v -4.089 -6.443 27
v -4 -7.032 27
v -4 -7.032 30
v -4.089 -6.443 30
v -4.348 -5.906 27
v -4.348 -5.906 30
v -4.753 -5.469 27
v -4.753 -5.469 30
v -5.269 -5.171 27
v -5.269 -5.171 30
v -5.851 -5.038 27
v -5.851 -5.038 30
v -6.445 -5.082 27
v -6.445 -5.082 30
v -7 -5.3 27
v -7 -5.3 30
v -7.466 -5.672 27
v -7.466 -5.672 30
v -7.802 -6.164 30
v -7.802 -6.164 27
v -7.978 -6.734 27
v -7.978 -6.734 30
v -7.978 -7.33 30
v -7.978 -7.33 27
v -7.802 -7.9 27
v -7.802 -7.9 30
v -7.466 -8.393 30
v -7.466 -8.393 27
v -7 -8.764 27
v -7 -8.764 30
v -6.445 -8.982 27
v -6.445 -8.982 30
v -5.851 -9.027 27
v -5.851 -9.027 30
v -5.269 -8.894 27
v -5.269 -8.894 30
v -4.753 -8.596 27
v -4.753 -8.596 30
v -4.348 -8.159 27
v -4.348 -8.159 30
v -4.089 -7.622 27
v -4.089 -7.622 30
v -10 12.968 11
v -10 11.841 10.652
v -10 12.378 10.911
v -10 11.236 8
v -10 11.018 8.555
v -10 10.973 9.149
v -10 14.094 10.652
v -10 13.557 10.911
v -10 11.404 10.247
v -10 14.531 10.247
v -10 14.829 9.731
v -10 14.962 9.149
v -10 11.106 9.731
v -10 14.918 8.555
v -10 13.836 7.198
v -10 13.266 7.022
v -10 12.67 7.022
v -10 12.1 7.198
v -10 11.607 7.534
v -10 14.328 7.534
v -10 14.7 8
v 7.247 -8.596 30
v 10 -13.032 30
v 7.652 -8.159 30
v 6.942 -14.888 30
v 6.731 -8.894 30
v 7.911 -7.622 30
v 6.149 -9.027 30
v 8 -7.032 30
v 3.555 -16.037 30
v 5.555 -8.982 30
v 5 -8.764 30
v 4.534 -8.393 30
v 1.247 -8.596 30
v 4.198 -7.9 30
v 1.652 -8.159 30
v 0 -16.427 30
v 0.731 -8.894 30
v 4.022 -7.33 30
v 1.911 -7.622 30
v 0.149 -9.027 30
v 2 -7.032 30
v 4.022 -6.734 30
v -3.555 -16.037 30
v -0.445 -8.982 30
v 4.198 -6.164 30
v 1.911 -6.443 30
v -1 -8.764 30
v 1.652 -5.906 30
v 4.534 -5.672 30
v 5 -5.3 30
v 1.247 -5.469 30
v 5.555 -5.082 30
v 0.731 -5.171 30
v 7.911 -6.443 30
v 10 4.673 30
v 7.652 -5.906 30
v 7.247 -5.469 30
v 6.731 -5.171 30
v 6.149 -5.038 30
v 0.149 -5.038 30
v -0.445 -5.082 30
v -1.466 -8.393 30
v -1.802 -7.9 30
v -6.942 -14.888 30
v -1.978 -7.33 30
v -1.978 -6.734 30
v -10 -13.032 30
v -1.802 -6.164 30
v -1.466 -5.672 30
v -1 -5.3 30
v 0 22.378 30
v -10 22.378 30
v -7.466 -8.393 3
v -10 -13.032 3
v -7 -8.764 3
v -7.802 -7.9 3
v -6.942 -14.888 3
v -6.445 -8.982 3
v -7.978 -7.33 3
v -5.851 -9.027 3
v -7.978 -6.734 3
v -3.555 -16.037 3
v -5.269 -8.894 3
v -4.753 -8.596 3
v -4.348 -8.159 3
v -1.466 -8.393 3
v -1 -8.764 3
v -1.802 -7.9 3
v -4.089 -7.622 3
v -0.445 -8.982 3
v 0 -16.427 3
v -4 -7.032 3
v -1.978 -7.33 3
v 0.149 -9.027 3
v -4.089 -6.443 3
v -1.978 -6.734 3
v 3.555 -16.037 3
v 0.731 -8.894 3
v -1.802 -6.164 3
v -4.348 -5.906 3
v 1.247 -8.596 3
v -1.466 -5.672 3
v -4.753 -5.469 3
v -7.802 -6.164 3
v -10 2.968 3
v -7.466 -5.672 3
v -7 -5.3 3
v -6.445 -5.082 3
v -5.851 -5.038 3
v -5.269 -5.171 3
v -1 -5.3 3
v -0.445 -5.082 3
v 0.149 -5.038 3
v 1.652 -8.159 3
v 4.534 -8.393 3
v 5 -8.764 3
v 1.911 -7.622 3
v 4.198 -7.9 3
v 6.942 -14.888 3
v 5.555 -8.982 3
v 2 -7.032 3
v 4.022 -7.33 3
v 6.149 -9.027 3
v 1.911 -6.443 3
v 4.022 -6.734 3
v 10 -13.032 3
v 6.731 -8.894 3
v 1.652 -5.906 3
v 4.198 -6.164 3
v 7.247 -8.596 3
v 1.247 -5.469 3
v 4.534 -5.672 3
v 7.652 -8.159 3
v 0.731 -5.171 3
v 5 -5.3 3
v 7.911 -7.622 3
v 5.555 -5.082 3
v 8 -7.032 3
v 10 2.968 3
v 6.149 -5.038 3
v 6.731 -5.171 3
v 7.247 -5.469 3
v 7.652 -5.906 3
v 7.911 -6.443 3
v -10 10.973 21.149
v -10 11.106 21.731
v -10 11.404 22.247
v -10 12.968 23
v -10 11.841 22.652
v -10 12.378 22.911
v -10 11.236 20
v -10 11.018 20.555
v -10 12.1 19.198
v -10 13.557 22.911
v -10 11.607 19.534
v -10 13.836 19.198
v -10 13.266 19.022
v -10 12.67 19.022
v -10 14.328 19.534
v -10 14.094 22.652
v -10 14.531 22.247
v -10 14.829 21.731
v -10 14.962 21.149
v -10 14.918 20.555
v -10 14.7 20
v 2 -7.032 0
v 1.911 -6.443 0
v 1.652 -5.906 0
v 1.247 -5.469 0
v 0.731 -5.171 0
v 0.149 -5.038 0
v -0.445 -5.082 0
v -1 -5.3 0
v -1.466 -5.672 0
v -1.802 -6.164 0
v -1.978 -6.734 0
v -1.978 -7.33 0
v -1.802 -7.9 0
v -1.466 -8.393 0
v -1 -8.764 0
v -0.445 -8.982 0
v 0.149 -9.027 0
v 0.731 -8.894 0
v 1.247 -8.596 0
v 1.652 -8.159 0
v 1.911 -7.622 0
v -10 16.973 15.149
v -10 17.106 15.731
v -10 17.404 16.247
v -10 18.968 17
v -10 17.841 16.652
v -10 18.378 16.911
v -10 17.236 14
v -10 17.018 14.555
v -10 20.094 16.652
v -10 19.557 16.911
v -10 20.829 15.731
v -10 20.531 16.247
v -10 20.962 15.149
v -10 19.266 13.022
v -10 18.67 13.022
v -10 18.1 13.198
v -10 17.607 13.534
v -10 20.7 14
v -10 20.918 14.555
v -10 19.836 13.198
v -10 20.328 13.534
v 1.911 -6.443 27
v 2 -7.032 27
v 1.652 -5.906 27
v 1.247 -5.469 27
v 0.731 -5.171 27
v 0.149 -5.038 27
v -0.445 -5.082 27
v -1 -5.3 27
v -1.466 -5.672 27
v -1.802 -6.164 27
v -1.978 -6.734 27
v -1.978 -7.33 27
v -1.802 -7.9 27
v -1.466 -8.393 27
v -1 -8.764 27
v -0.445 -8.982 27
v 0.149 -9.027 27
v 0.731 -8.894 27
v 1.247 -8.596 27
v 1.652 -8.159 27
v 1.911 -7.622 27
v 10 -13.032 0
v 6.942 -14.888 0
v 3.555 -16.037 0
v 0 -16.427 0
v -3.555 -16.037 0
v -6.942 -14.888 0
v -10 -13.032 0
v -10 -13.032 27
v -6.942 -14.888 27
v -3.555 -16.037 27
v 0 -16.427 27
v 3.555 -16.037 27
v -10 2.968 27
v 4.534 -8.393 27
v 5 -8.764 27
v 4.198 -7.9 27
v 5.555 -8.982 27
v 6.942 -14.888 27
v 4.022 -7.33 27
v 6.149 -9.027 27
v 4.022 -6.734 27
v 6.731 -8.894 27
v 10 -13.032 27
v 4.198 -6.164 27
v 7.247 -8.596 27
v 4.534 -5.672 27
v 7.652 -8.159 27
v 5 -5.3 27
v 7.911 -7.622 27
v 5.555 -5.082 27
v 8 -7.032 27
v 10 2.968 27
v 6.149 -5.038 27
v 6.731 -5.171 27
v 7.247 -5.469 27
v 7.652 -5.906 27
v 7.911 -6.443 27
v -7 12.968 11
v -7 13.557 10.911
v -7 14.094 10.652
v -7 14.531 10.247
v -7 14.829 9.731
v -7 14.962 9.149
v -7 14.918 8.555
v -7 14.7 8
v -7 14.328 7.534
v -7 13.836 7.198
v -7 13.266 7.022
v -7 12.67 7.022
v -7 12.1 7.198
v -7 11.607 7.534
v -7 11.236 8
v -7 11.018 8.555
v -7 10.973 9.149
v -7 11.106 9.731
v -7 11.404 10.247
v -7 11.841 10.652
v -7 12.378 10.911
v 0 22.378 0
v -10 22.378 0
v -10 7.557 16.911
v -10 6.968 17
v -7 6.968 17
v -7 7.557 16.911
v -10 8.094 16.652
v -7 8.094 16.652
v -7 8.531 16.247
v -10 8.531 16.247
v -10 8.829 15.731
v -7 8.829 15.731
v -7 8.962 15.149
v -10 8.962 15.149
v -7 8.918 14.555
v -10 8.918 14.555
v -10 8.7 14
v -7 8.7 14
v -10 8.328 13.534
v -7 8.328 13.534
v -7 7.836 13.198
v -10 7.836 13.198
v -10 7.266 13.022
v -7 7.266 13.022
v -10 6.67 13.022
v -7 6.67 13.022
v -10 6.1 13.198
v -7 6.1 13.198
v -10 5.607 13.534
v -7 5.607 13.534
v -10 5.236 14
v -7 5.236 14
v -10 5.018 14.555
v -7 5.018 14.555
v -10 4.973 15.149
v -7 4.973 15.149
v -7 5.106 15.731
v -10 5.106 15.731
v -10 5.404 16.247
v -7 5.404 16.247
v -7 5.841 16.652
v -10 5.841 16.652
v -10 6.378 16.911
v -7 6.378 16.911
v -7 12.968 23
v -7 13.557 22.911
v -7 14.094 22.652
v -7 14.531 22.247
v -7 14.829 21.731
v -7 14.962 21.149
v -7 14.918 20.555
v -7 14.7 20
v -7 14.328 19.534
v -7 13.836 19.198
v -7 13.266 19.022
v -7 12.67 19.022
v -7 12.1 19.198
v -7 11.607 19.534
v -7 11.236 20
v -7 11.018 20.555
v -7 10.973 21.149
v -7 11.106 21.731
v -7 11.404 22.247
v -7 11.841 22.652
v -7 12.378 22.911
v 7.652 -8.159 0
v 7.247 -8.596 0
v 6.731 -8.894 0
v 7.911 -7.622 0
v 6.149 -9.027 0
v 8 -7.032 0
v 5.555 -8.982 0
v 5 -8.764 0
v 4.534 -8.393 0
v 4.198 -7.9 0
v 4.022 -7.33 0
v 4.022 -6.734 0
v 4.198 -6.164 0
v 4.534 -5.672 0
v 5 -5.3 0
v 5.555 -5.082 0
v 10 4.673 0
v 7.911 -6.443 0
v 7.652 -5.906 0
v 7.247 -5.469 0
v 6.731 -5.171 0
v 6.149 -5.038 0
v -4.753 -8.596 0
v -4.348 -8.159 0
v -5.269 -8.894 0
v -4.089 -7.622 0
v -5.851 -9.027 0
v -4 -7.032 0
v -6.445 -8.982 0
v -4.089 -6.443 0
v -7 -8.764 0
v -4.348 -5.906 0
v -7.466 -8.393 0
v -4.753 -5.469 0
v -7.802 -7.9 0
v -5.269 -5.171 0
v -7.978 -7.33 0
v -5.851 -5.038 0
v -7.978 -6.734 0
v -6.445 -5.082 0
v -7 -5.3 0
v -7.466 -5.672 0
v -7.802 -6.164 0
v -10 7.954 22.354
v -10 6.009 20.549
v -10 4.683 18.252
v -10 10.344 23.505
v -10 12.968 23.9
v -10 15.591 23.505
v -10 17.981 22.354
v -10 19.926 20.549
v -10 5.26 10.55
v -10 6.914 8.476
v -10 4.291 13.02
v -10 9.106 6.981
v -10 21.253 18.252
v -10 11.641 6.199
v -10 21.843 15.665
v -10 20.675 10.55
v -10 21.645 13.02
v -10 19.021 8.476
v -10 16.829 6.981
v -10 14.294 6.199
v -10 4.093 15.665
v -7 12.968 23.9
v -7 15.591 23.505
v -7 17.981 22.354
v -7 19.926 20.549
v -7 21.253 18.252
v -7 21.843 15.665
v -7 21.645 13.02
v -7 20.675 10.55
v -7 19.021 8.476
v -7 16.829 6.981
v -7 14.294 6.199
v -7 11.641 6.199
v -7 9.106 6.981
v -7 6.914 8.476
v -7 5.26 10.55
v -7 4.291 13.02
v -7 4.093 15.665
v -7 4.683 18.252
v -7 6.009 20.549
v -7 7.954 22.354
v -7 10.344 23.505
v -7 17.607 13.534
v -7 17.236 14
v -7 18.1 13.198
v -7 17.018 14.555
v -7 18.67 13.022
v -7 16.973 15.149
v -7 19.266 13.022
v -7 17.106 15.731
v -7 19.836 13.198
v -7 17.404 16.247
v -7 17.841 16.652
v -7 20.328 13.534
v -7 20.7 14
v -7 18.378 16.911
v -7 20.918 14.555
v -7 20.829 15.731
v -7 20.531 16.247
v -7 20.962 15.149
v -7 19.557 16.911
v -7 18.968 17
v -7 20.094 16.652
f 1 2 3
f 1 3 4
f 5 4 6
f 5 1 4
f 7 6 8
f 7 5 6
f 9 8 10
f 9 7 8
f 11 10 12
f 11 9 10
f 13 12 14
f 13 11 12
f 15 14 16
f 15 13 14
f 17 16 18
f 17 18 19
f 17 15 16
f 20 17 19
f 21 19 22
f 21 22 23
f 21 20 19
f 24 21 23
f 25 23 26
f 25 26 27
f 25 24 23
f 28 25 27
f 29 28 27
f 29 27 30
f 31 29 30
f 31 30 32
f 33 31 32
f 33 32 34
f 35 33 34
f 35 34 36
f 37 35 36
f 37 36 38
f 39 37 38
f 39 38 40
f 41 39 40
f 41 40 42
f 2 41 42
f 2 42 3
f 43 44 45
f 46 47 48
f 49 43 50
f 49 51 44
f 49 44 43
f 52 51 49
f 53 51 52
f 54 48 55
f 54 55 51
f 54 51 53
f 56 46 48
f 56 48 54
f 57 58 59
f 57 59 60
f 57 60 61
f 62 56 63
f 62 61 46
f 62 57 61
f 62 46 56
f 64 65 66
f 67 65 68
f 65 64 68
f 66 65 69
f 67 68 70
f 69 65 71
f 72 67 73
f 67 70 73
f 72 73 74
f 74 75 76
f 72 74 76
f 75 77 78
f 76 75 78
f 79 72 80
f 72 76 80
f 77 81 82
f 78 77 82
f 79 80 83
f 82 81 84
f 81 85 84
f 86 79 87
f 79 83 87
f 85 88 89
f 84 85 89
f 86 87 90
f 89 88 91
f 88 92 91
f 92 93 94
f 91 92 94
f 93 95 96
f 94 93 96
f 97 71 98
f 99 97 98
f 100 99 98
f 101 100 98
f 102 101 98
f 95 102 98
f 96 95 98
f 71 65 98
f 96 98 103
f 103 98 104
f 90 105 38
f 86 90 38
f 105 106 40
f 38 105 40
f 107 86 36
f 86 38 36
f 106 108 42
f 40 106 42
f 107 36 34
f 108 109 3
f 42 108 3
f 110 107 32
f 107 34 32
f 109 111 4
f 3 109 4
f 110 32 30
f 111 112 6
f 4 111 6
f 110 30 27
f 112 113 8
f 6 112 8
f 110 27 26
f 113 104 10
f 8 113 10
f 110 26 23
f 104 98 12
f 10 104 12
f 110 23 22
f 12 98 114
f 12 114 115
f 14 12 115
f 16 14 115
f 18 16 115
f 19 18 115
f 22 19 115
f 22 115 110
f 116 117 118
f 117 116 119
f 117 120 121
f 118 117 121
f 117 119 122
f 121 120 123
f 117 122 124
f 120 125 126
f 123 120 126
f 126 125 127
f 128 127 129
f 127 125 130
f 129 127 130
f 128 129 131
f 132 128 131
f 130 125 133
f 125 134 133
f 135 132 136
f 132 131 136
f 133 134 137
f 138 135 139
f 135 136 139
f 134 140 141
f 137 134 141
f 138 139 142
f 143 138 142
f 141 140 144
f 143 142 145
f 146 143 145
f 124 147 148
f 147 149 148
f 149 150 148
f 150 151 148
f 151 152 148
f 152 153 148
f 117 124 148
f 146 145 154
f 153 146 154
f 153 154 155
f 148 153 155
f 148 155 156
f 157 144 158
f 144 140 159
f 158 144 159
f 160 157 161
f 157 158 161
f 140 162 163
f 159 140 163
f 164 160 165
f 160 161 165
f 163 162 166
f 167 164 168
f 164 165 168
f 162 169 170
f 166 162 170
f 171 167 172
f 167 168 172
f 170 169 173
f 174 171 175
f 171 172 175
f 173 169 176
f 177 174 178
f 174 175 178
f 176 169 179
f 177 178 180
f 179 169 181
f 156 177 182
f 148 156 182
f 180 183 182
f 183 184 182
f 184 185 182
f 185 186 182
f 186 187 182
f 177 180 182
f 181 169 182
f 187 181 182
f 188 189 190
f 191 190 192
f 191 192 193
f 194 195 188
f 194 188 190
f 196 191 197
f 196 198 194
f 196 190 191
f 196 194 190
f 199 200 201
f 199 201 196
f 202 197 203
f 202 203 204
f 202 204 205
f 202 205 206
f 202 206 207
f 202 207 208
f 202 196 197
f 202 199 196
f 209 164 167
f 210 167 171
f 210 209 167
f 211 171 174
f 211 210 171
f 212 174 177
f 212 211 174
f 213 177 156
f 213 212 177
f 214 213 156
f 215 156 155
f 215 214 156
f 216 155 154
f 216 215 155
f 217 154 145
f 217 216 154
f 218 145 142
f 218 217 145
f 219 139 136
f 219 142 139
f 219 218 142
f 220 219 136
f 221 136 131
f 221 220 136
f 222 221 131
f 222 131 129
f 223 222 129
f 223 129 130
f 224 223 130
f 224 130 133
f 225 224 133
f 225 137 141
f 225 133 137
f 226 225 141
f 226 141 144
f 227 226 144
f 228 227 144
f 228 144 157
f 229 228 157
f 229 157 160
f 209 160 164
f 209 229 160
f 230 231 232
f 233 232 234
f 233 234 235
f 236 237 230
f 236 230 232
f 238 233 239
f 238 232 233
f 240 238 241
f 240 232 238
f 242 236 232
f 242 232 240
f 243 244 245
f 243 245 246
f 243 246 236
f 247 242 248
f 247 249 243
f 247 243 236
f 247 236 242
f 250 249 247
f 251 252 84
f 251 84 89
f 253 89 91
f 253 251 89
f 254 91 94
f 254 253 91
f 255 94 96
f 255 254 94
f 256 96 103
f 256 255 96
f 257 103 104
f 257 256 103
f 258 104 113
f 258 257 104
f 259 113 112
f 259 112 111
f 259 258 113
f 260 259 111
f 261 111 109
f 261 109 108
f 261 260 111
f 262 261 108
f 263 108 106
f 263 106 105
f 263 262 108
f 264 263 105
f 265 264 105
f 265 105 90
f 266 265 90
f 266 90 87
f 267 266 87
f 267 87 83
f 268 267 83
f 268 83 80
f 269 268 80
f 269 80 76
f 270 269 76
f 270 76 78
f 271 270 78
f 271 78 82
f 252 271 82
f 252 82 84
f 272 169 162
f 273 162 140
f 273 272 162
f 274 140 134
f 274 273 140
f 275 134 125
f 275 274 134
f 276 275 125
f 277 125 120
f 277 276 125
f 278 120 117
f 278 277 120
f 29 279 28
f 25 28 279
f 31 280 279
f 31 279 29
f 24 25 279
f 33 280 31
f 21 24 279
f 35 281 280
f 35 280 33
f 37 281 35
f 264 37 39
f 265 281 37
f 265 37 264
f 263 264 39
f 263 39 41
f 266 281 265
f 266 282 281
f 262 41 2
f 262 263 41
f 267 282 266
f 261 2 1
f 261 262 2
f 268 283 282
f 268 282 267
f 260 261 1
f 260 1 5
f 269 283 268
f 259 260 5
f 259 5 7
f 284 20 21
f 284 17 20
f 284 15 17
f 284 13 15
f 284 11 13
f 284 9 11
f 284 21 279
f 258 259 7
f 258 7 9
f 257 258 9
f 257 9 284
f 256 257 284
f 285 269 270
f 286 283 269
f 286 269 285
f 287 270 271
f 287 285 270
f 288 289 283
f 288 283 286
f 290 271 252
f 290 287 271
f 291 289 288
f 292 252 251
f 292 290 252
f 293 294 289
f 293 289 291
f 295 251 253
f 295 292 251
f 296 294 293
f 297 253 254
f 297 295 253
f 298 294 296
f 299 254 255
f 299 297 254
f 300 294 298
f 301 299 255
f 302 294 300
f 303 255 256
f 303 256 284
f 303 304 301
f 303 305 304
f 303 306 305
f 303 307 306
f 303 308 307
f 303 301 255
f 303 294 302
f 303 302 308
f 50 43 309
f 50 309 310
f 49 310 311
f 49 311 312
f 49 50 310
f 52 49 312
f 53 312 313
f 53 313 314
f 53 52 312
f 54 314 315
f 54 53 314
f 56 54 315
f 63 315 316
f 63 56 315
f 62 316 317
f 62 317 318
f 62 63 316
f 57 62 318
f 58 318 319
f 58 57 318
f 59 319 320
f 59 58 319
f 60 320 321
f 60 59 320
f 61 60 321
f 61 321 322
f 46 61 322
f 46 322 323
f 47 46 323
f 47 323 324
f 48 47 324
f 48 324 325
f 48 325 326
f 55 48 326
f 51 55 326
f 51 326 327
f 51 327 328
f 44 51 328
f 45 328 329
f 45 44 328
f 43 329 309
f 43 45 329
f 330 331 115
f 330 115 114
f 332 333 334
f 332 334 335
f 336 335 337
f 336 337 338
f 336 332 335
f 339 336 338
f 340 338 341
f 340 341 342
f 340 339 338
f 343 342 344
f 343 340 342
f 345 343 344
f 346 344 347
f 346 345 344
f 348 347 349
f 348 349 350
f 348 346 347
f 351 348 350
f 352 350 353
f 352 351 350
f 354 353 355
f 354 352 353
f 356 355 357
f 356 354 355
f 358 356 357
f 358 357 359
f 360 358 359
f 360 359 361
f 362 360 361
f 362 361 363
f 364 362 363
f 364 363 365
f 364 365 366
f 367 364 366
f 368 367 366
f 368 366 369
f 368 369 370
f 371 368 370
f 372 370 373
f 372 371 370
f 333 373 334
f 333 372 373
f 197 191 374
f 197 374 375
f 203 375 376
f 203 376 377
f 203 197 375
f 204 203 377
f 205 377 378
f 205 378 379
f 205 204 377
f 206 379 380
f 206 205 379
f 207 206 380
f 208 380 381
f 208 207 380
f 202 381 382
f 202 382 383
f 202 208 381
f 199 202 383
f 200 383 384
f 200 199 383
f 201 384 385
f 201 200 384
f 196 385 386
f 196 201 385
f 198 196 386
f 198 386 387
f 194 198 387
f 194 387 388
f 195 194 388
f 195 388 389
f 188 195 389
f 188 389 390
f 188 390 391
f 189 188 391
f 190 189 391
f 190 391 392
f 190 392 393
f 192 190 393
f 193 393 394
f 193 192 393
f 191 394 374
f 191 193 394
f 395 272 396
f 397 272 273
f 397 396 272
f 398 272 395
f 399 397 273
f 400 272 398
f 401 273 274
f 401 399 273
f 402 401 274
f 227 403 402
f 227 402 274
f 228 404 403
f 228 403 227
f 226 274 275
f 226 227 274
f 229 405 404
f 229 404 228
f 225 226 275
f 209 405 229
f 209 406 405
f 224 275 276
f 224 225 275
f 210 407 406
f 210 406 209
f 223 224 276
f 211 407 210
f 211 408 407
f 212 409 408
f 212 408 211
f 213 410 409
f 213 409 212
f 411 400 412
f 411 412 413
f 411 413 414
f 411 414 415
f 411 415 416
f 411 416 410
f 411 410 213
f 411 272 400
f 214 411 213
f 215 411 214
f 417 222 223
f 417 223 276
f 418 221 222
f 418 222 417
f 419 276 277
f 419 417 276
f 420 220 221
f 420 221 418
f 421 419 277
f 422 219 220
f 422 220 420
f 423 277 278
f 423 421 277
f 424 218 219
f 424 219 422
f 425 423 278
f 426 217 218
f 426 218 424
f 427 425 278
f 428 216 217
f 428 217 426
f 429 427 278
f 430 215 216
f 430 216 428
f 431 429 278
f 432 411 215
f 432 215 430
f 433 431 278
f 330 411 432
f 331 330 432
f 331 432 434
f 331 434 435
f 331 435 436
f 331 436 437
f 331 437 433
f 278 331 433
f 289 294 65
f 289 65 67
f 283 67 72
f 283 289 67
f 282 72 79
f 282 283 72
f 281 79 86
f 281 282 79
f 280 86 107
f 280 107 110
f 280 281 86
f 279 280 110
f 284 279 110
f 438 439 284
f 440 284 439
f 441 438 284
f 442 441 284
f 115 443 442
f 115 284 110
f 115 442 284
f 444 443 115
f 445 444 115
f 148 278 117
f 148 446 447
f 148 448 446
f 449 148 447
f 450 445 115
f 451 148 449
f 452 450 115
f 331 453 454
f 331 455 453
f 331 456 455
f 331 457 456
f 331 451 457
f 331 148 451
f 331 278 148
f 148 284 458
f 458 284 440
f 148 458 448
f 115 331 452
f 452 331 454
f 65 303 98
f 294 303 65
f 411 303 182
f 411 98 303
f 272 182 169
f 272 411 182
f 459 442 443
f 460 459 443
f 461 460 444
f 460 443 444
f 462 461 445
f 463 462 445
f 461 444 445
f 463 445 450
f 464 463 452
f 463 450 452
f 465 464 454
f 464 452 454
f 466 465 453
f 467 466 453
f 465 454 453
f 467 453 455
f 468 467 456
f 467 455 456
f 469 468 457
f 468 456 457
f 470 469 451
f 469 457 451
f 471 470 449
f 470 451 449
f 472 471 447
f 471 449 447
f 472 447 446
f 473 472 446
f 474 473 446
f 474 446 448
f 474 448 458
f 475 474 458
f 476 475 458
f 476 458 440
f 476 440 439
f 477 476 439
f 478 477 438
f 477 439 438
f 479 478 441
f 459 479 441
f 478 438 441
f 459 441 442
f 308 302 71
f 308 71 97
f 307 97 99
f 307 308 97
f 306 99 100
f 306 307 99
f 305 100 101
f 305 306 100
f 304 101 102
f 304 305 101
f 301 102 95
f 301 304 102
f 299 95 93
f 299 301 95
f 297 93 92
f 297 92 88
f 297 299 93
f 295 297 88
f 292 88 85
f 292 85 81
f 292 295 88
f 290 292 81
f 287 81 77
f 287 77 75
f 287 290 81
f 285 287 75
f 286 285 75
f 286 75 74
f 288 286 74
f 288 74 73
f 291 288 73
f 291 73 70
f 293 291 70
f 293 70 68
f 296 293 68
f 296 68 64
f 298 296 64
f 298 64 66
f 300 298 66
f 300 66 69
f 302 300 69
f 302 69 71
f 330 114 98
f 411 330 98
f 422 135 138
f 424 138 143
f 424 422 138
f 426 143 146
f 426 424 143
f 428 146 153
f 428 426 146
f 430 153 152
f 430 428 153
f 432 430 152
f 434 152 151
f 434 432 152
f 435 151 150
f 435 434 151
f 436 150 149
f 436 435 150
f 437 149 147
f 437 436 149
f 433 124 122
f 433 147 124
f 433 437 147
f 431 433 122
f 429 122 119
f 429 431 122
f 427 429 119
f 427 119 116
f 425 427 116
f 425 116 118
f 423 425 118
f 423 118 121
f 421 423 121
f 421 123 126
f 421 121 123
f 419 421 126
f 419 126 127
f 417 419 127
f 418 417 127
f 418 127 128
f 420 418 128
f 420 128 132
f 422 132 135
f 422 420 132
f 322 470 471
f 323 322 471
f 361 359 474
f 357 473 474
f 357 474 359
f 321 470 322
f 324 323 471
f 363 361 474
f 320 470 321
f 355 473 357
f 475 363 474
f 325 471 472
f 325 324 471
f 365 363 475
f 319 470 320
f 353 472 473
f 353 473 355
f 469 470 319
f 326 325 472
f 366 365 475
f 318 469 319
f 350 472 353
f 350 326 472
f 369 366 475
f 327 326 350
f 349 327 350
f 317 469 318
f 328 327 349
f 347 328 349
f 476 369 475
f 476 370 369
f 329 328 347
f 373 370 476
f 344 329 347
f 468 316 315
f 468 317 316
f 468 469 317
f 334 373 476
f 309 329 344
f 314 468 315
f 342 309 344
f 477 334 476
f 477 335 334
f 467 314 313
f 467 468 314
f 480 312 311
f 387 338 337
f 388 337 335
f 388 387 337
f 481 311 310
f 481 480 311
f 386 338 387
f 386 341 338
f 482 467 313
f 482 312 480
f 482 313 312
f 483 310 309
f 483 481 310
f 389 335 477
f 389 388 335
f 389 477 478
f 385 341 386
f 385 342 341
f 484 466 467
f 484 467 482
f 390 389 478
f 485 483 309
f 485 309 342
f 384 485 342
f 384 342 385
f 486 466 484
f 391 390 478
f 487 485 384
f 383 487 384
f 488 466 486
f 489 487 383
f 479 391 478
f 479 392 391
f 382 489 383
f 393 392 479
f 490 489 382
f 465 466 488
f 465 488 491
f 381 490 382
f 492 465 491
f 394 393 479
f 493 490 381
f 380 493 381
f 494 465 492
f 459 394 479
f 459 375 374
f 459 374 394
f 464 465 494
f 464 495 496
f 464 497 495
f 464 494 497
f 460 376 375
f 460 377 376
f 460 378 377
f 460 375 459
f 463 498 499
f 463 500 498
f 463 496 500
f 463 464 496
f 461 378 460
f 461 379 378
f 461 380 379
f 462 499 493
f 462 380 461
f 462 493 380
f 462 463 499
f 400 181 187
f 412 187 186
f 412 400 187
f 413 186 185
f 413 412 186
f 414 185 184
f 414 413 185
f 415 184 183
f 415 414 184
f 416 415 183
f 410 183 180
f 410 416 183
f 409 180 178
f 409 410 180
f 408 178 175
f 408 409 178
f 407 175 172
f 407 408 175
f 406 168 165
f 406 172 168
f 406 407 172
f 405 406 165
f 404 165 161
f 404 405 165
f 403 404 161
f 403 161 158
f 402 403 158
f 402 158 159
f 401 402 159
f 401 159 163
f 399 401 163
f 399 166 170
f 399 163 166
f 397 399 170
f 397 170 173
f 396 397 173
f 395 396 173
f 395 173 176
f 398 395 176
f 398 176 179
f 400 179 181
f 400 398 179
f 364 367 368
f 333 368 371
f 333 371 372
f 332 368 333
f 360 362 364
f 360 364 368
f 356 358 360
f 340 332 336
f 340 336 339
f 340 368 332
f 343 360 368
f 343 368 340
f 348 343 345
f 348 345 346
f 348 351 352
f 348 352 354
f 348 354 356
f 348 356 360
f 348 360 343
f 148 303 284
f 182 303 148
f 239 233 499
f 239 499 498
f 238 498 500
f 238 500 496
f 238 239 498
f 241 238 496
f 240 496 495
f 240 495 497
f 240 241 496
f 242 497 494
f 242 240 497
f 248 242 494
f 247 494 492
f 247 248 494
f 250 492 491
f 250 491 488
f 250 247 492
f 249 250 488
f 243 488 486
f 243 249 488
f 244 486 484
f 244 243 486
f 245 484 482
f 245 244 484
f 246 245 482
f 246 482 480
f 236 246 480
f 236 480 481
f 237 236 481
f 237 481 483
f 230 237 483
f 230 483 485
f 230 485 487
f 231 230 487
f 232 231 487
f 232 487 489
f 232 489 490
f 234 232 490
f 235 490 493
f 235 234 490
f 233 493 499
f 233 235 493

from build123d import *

# Parameters (mm, degrees)
SKETCH1_R           = 2
BOSS_EXTRUDE1_DEPTH = 30
SKETCH2_W           = 24
SKETCH2_H           = 19.394542589
CUT_EXTRUDE1_DEPTH  = 43.435404183
SKETCH3_R           = 8.9
SKETCH3_R_2         = 2
CUT_EXTRUDE2_DEPTH  = 3


with BuildPart() as part:
    # Sketch1 → Boss-Extrude1 (new body)
    with BuildSketch(Plane.XY):
        with BuildLine():
            Line((-10, 22.377746272), (0, 22.377746272))
            Line((0, 22.377746272), (10, 4.672746272))
            Line((10, 4.672746272), (10, -13.032253728))
            ThreePointArc((10, -13.032253728), (0, -16.426796317), (-10, -13.032253728))
            Line((-10, -13.032253728), (-10, 22.377746272))
        make_face()
        with Locations((0, -7.032253728)):
            Circle(SKETCH1_R, mode=Mode.SUBTRACT)
        with Locations((6, -7.032253728)):
            Circle(SKETCH1_R, mode=Mode.SUBTRACT)
        with Locations((-6, -7.032253728)):
            Circle(SKETCH1_R, mode=Mode.SUBTRACT)
    extrude(amount=BOSS_EXTRUDE1_DEPTH)

    # Sketch2 → Cut-Extrude1 (cut, through all)
    with BuildSketch(Plane(origin=(10, 0, 0), x_dir=(0, 0, -1), z_dir=(1, 0, 0))):
        with Locations((-15, -6.729525023)):
            Rectangle(SKETCH2_W, SKETCH2_H)
    extrude(amount=-CUT_EXTRUDE1_DEPTH, mode=Mode.SUBTRACT)

    # Sketch3 → Cut-Extrude2 (cut)
    with BuildSketch(Plane.ZY.offset(10)):
        with Locations((15, 12.967746272)):
            Circle(SKETCH3_R)
        with Locations((15, 18.967746272)):
            Circle(SKETCH3_R_2, mode=Mode.SUBTRACT)
        with Locations((15, 6.967746272)):
            Circle(SKETCH3_R_2, mode=Mode.SUBTRACT)
        with Locations((9, 12.967746272)):
            Circle(SKETCH3_R_2, mode=Mode.SUBTRACT)
        with Locations((21, 12.967746272)):
            Circle(SKETCH3_R_2, mode=Mode.SUBTRACT)
    extrude(amount=-CUT_EXTRUDE2_DEPTH, mode=Mode.SUBTRACT)


solid = part.part
